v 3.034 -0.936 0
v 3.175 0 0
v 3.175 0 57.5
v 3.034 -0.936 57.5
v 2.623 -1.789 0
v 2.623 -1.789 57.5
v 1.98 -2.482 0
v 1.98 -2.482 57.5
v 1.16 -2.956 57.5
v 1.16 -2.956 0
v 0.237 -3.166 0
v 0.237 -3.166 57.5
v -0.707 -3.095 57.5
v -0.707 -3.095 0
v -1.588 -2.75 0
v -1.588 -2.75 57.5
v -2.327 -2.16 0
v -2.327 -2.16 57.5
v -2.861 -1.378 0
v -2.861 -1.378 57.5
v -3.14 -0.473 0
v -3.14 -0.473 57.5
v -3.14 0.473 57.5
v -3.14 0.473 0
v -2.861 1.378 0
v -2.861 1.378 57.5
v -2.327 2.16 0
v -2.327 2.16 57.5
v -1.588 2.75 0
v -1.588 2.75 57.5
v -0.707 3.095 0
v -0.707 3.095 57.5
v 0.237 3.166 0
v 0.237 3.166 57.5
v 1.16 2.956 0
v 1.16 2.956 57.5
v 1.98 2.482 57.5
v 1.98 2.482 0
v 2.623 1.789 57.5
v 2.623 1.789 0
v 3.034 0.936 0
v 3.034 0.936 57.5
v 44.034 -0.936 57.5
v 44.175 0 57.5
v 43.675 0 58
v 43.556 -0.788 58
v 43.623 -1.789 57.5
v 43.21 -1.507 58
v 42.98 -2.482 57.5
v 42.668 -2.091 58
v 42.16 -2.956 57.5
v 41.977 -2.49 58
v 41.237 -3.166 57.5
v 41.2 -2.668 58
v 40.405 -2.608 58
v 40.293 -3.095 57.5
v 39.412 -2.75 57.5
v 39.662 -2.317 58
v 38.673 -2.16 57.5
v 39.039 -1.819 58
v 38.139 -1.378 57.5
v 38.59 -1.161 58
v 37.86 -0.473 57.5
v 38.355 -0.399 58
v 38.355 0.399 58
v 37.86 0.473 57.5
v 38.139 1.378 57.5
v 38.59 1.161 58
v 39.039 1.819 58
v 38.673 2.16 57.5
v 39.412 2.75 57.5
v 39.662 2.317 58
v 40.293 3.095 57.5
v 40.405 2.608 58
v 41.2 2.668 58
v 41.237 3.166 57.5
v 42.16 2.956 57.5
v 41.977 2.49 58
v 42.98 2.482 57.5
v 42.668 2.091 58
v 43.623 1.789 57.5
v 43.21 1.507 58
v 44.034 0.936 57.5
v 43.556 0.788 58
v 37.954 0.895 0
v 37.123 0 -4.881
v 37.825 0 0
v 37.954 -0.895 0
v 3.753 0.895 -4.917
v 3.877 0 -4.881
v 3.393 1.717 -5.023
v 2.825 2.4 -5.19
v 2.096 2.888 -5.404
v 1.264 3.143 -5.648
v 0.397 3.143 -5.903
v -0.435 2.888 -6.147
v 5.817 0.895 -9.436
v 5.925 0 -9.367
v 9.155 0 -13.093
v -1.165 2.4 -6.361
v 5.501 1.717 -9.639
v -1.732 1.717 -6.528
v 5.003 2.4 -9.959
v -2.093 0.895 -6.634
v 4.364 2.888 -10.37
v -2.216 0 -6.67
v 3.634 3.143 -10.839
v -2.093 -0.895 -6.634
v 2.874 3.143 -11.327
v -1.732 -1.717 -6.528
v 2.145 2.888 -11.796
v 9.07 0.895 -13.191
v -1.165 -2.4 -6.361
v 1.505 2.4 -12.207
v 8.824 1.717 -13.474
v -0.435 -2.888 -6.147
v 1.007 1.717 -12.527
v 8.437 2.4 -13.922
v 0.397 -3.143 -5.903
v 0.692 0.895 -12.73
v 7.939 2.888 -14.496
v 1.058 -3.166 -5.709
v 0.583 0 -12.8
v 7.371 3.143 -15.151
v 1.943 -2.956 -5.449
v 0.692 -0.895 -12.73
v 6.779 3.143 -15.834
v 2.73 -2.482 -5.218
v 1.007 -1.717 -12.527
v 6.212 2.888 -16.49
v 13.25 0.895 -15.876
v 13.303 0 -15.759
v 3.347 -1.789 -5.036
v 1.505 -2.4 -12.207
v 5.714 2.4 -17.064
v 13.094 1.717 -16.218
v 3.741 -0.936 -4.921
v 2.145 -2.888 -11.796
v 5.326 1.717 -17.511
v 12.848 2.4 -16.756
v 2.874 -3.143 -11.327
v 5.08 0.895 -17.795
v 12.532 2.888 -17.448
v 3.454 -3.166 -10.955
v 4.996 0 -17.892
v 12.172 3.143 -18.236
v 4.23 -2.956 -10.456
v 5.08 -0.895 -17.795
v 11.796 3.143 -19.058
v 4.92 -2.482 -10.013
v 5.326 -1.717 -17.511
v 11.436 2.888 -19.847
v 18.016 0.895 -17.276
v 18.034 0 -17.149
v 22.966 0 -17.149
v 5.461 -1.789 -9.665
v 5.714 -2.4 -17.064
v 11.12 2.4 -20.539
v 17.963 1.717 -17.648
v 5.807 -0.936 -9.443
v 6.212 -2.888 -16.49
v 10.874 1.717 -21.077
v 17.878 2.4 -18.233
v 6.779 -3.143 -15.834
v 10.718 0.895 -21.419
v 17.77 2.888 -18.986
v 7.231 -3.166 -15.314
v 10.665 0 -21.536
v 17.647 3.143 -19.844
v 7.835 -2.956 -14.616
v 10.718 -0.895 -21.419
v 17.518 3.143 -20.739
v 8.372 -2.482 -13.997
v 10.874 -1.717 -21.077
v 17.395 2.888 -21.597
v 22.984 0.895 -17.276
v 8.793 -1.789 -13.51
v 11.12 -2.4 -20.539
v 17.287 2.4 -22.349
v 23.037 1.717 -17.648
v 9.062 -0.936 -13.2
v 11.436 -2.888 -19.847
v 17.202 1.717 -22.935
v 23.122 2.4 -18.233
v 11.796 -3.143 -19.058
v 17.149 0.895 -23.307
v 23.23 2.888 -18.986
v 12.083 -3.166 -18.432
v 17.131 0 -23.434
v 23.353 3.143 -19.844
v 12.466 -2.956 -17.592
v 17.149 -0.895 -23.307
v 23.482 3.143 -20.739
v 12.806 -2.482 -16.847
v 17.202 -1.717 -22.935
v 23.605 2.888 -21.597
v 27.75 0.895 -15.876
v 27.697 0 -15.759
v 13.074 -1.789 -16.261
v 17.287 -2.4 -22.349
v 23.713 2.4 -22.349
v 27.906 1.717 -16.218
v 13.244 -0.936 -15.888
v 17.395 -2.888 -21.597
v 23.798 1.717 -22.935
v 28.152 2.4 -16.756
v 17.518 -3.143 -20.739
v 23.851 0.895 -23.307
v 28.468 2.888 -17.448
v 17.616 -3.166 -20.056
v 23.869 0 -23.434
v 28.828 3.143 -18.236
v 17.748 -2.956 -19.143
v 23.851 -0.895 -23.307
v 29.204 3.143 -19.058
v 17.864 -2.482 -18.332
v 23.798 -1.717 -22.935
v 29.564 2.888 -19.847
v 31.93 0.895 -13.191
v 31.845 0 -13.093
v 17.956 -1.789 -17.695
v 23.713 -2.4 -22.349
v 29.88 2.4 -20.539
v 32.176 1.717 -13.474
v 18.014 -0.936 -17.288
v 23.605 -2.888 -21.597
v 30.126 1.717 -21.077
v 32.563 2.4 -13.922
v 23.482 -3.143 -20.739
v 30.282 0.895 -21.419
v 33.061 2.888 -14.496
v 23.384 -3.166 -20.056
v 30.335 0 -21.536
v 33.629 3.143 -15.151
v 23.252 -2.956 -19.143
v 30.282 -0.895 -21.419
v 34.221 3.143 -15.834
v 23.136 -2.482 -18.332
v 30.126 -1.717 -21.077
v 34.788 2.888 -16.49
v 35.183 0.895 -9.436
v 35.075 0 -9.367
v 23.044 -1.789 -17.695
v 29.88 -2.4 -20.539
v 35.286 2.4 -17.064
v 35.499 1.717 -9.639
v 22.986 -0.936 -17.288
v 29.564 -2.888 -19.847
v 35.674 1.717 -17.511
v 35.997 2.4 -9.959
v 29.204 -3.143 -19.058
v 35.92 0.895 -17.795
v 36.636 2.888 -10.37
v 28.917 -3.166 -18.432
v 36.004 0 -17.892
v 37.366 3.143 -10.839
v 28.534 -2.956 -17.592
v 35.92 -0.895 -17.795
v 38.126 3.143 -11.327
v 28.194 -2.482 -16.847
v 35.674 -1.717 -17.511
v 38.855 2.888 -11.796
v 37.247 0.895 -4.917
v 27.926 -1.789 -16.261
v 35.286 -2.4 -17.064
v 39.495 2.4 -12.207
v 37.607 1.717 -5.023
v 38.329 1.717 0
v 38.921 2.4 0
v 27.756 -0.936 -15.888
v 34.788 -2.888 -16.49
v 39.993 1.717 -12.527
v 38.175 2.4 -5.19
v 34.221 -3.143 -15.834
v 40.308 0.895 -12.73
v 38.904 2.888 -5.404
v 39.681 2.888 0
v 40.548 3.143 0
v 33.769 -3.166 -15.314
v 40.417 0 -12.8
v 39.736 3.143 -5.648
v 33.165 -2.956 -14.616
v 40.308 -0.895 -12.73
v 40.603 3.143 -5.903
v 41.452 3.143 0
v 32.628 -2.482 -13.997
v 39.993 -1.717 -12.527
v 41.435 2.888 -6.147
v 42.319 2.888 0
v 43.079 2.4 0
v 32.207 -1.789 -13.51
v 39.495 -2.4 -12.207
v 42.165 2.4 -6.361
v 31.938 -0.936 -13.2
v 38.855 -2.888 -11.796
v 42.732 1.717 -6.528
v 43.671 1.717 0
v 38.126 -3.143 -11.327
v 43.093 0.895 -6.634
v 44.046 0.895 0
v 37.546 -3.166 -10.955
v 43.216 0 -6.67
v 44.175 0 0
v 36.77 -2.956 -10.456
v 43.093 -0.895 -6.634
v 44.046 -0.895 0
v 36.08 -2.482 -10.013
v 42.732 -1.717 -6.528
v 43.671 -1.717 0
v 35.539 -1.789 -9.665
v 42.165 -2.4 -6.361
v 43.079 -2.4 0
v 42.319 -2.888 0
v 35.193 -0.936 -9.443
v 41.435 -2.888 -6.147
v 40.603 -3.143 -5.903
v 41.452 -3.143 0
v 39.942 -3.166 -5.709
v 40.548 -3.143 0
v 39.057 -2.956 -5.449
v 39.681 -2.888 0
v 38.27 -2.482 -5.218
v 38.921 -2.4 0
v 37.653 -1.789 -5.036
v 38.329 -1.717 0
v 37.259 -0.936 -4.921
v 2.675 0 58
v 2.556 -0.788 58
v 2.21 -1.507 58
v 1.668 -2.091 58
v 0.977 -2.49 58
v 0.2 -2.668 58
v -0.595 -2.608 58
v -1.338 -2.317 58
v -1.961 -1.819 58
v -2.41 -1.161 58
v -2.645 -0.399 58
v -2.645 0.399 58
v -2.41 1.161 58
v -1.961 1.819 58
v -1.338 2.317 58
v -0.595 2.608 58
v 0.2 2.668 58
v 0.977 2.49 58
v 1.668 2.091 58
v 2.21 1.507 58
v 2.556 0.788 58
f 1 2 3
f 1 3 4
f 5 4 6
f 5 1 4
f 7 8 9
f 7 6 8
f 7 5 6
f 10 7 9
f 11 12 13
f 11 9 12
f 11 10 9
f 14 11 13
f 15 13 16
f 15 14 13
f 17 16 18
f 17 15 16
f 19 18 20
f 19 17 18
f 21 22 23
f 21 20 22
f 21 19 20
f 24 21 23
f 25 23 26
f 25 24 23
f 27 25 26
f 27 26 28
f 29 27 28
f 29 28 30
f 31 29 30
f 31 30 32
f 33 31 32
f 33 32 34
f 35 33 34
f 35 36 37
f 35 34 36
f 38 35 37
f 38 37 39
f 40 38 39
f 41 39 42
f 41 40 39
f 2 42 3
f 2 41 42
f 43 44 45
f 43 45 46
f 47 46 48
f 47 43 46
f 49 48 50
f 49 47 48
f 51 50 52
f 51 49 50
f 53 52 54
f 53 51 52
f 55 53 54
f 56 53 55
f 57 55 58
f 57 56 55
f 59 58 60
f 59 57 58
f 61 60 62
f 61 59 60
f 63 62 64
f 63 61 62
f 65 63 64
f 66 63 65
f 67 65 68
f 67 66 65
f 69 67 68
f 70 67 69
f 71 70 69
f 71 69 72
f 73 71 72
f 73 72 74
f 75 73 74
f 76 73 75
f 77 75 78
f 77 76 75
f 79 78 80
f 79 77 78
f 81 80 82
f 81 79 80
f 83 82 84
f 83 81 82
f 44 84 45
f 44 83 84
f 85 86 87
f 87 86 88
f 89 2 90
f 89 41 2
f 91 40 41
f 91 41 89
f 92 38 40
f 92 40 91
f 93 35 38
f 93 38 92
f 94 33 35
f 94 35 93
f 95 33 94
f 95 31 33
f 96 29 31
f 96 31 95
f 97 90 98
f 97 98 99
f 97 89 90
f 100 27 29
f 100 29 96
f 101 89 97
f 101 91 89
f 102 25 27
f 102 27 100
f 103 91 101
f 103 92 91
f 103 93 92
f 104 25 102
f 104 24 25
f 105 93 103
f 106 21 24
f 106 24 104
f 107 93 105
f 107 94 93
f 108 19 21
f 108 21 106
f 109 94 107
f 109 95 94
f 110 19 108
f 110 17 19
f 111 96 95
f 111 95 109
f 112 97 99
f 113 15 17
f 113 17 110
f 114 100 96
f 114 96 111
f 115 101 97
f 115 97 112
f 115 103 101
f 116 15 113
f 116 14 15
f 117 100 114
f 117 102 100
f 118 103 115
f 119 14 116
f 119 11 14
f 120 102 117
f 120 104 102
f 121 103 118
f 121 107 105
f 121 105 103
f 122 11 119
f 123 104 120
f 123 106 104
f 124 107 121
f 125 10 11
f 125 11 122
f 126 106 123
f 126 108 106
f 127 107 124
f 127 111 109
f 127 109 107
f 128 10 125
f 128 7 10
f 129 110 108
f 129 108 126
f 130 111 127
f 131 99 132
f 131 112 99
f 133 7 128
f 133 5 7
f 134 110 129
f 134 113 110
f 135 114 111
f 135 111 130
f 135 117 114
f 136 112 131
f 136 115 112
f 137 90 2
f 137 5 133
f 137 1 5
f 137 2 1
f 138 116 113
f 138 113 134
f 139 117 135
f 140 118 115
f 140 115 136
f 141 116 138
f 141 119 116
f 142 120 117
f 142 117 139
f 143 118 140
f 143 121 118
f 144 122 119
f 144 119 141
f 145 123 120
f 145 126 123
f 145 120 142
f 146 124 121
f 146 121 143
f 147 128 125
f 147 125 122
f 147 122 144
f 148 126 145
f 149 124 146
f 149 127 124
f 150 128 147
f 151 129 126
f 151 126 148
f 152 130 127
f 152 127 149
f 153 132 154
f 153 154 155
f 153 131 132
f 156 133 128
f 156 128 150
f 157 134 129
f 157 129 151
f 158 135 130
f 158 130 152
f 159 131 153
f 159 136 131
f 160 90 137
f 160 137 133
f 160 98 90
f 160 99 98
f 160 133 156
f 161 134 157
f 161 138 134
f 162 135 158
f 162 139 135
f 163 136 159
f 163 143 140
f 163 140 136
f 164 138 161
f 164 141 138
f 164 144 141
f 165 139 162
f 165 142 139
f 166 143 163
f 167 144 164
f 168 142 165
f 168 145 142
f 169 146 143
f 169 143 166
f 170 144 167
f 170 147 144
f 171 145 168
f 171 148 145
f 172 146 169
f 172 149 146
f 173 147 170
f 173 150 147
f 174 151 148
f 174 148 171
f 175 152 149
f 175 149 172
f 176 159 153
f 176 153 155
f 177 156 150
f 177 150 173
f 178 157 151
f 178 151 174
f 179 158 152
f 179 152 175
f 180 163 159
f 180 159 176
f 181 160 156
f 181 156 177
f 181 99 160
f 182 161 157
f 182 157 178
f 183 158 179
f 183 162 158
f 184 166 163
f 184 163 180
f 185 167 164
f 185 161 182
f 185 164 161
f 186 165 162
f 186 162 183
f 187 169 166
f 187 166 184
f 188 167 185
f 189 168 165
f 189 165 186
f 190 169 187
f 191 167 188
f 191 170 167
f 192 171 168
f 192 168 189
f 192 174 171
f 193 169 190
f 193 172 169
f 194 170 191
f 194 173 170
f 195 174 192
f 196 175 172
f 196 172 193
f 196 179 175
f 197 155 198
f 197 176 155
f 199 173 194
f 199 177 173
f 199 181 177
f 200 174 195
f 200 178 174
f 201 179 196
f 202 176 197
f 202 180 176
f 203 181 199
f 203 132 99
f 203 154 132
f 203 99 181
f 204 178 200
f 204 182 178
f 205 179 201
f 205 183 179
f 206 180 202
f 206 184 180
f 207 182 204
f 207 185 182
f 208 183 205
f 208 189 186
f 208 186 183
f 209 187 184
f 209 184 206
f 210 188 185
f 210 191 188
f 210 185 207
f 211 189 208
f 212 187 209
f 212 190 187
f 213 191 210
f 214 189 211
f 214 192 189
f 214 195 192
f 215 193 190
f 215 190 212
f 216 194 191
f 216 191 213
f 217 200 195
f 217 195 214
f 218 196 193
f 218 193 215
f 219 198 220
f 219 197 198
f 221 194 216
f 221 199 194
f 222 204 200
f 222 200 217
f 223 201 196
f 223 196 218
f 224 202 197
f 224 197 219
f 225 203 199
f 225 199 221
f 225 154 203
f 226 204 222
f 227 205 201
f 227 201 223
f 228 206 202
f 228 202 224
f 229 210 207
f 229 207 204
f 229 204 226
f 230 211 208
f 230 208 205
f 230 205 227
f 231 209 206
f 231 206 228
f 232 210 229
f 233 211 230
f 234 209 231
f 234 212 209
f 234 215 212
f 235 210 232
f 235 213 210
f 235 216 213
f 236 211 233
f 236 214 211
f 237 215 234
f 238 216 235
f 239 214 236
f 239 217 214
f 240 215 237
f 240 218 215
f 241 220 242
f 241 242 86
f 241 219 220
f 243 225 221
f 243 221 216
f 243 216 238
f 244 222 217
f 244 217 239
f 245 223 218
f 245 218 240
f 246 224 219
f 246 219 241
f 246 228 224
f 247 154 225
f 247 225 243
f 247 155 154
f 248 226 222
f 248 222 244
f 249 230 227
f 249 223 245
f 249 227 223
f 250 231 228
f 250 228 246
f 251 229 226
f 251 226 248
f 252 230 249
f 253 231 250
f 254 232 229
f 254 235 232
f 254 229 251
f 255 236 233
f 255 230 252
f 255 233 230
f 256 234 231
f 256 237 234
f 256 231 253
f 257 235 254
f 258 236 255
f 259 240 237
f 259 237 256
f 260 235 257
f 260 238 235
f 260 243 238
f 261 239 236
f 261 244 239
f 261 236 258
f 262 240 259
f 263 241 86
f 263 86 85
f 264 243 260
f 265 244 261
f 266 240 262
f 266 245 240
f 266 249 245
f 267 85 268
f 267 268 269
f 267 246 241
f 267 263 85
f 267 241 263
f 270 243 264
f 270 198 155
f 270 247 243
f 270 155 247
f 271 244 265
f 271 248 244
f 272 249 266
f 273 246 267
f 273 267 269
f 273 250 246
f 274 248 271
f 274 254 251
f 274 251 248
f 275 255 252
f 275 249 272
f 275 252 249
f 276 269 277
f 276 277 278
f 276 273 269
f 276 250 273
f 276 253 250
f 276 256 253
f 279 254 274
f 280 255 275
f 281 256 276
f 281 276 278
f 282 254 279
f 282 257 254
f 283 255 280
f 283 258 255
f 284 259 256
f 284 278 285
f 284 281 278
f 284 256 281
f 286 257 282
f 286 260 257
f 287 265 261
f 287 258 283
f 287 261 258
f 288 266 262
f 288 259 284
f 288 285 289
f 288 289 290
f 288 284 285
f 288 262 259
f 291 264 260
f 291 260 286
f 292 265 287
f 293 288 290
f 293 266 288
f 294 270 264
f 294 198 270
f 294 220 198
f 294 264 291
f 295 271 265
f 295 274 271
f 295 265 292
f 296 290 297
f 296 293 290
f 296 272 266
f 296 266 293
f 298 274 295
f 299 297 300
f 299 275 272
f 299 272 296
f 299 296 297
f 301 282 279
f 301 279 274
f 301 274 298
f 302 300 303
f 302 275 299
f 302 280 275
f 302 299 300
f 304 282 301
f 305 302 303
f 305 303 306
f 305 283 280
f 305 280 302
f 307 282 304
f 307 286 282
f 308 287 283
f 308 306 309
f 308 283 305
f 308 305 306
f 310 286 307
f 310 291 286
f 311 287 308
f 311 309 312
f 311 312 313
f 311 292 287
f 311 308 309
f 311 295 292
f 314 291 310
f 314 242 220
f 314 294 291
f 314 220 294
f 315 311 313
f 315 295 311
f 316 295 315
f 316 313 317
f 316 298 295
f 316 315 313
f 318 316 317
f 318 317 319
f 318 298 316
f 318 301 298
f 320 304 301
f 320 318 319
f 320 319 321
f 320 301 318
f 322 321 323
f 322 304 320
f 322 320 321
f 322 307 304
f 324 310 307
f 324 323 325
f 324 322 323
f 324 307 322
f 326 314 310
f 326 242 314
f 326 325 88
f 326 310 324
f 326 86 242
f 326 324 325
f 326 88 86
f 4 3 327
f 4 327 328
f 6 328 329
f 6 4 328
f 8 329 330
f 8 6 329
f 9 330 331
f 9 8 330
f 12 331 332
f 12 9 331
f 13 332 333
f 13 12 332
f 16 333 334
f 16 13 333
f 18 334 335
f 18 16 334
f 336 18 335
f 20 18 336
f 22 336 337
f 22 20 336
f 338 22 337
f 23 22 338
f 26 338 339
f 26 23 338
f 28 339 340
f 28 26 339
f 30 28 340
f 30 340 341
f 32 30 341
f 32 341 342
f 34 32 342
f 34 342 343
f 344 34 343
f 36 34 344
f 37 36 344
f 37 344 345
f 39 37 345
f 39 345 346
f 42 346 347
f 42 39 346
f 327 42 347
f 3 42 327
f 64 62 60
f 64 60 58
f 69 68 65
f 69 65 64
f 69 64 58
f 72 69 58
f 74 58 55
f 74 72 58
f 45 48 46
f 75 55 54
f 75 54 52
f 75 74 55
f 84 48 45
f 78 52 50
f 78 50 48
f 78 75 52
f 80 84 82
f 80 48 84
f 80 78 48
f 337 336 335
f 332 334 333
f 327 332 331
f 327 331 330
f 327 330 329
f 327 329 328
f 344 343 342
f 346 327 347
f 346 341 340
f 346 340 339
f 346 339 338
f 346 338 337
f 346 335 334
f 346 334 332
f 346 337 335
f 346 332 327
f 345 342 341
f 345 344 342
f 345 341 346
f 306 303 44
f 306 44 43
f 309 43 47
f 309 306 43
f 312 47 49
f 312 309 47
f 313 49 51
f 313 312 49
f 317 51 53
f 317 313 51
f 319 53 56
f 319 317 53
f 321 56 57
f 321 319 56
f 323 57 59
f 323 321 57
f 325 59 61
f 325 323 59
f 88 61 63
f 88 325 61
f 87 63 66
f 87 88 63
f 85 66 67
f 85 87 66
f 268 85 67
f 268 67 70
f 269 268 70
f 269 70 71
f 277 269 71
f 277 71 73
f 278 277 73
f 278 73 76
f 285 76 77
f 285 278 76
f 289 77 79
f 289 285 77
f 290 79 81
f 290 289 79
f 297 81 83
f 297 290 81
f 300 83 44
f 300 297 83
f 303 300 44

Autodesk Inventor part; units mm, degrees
ref_plane "YZ Plane" through (0, 0, 0) normal (1, 0, 0) x (0, 1, 0)
ref_plane "XZ Plane" through (0, 0, 0) normal (0, 1, 0) x (-1, 0, 0)
ref_plane "XY Plane" through (0, 0, 0) normal (0, 0, 1) x (1, 0, 0)
sketch "Esboço1" plane through (0, 0, 0) normal (0, 0, 1) x (1, 0, 0)
  circle A0 centre (0, 0) radius 3.175
  line L0 (20.5, 0) -> (20.5, 7.6069)
  dimension "d1" = 6.35
revolve "Revolução1" add sketch "Esboço1" angle 180 about axis through (20.5, 0, 0) along (0, -1, 0)
sketch "Esboço2" plane through (0, 0, 0) normal (0, 0, 1) x (1, 0, 0)
  circle A0 centre (0, 0) radius 3.175
  circle A1 centre (41, 0) radius 3.175 projected
  circle A2 centre (41, 0) radius 3.175
extrude "Extrusão1" add sketch "Esboço2" along normal blind 58
thread "Rosca1" size "1/4-20 UNC" class "2A" standard "ANSI Unified Screw Threads" length 50 offset 8
thread "Rosca2" size "1/4-20 UNC" class "2A" standard "ANSI Unified Screw Threads" length 50
chamfer "Chanfro1" distance 0.5 angle 45 2 edges at (-3.175, 0, 58) (37.825, 0, 58)
properties part number "0070.1 - Abraçadeira U Vergalhão bitola 1 polegada 80mm rosca 1 quarto" material "Aço, carbono"
